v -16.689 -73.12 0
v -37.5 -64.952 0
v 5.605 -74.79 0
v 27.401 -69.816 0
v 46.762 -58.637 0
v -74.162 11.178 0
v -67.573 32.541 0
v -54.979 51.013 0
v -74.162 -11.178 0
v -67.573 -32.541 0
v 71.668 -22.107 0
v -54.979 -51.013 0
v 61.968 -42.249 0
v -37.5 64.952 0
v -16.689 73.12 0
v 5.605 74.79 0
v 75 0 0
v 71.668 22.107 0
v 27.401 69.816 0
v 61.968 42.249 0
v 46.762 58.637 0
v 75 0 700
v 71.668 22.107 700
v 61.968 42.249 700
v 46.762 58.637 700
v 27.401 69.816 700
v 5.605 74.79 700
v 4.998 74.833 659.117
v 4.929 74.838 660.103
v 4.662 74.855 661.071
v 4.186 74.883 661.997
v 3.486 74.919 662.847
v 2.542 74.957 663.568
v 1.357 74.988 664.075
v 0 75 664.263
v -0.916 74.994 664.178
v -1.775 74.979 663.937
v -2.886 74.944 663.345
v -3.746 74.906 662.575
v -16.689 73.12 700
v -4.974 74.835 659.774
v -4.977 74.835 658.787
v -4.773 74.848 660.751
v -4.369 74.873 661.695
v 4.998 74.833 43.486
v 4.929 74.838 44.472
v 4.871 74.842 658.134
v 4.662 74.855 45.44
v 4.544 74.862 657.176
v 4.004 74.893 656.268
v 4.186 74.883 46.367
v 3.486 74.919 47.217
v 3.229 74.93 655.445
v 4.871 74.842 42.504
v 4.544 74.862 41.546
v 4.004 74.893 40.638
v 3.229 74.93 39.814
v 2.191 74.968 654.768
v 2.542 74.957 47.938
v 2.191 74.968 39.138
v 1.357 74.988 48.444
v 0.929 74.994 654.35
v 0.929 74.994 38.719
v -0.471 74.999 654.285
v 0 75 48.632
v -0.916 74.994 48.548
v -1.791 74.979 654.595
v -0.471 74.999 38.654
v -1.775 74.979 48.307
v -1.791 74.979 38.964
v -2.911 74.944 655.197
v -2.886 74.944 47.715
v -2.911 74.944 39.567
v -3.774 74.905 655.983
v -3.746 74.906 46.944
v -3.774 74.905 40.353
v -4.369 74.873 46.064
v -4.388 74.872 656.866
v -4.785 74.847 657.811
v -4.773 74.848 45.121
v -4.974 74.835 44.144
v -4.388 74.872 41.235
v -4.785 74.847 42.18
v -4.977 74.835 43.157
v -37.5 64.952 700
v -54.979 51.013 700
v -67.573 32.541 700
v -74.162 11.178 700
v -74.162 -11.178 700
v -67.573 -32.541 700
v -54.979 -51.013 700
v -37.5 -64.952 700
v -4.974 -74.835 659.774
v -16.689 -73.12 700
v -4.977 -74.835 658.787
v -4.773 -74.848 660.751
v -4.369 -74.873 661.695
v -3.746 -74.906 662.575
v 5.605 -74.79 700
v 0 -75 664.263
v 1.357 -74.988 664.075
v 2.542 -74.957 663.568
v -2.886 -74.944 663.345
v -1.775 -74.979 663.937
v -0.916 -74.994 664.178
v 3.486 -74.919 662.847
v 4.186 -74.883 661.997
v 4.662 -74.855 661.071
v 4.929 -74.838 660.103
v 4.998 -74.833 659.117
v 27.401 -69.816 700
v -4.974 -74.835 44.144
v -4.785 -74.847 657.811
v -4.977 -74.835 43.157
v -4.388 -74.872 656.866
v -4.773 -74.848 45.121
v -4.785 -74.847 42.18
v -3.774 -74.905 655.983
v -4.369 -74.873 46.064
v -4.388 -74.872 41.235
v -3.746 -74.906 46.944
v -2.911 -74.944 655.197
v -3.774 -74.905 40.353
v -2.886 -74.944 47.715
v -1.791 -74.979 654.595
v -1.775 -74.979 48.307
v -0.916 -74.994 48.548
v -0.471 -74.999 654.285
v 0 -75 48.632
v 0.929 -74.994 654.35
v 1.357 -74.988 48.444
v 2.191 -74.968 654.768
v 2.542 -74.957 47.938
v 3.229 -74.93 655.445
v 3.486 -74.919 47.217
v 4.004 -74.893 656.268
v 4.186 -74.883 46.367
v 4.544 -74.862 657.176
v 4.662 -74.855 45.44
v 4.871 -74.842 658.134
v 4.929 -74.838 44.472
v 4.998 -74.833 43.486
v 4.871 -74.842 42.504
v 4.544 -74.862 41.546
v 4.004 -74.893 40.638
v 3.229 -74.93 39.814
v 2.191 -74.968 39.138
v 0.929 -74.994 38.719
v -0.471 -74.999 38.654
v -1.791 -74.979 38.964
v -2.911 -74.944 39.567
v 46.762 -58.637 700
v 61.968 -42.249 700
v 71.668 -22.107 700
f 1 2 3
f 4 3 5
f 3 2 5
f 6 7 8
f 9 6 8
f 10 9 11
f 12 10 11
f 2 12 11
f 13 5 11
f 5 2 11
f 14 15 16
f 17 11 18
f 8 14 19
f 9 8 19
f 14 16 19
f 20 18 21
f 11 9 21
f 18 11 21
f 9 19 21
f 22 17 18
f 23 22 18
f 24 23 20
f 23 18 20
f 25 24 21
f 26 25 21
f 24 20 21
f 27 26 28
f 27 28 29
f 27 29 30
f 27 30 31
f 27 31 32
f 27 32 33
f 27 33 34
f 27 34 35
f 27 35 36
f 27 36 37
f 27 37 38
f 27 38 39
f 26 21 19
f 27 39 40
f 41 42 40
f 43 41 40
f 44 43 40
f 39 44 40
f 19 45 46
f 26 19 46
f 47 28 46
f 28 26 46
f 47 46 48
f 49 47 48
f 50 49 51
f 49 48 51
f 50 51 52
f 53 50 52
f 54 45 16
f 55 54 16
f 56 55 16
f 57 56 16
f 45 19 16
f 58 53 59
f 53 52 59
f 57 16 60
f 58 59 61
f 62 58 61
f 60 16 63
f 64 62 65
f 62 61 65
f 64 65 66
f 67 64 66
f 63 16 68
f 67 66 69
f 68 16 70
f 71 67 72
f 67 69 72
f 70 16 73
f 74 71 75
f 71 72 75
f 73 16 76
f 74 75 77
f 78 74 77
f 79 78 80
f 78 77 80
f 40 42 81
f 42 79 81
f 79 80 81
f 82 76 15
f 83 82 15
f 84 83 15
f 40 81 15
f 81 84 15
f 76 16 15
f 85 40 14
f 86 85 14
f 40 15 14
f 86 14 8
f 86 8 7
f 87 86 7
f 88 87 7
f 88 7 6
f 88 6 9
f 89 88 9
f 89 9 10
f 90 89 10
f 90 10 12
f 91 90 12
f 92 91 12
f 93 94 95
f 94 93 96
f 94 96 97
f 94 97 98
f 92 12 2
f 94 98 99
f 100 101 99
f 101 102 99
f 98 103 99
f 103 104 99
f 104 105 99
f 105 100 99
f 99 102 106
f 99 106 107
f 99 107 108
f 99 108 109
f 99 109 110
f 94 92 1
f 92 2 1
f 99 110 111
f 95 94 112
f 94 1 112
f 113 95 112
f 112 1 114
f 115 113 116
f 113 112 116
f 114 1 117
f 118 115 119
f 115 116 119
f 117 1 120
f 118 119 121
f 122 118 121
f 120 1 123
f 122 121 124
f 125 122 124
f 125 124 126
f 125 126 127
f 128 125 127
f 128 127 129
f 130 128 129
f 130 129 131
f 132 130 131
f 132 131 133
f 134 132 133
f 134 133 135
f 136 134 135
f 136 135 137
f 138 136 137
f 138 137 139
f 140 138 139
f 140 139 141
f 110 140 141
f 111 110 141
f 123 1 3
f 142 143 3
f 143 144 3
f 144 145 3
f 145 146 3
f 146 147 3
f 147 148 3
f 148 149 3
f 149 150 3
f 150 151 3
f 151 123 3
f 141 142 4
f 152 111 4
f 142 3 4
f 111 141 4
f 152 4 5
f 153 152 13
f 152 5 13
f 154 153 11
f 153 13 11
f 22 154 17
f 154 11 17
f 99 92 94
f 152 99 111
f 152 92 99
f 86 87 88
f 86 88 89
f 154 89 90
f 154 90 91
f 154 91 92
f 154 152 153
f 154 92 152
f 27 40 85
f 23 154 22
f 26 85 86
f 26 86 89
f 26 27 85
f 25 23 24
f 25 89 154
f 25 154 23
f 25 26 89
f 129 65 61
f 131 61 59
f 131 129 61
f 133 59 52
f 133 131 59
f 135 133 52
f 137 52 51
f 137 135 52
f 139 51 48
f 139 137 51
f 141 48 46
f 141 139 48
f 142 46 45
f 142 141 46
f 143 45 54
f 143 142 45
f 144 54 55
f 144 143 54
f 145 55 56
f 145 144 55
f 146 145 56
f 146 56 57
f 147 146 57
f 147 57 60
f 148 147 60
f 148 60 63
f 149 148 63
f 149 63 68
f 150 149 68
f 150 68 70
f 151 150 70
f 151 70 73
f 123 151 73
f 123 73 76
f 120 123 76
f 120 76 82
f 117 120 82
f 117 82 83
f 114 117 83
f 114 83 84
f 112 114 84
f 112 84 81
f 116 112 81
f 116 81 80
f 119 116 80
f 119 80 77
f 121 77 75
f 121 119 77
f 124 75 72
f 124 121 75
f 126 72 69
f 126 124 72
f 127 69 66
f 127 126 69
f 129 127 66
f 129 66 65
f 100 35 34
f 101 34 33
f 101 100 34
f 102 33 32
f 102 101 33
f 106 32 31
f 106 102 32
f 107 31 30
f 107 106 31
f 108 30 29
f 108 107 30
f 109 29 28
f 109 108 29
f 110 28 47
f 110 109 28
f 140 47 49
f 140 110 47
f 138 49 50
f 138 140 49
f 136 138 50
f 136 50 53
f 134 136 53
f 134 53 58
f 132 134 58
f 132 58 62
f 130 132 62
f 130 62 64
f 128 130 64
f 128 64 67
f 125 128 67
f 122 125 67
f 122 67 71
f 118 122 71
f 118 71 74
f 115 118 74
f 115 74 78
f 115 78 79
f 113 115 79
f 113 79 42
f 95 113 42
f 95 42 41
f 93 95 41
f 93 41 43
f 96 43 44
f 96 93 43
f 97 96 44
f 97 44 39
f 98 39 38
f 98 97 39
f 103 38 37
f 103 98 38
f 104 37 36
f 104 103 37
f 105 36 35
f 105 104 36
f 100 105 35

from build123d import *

# Parameters (mm, degrees)
SCHIZZO1_R                    = 75
ESTRUSIONE_ESTRUSIONE1_DEPTH  = 700
TAGLIO_ESTRUSIONE1_DEPTH      = 708.990112925
TAGLIO_ESTRUSIONE1_DEPTH_BACK = 708.990112925
SCHIZZO2_R                    = 5
TAGLIO_ESTRUSIONE2_DEPTH      = 708.990113045
TAGLIO_ESTRUSIONE2_DEPTH_BACK = 708.990113045
SCHIZZO3_R                    = 5


with BuildPart() as part:
    # Schizzo1 → Estrusione-Estrusione1 (new body)
    with BuildSketch(Plane.XY):
        Circle(SCHIZZO1_R)
    extrude(amount=ESTRUSIONE_ESTRUSIONE1_DEPTH)

    # Schizzo2 → Taglio-Estrusione1 (cut, two sides: drawn at the far end of the back side and taken through both)
    with BuildSketch(Plane(origin=(0, 0, 0), x_dir=(1, 0, 0), z_dir=(0, 1, 0)).offset(-TAGLIO_ESTRUSIONE1_DEPTH_BACK)):
        with Locations(Location((0, -43.632162592, 0), (0, 0, 270))):
            Circle(SCHIZZO2_R)
    extrude(amount=TAGLIO_ESTRUSIONE1_DEPTH + TAGLIO_ESTRUSIONE1_DEPTH_BACK, mode=Mode.SUBTRACT)

    # Schizzo3 → Taglio-Estrusione2 (cut, two sides: drawn at the far end of the back side and taken through both)
    with BuildSketch(Plane(origin=(0, 0, 0), x_dir=(1, 0, 0), z_dir=(0, 1, 0)).offset(-TAGLIO_ESTRUSIONE2_DEPTH_BACK)):
        with Locations(Location((0, -659.26265162, 0), (0, 0, 270))):
            Circle(SCHIZZO3_R)
    extrude(amount=TAGLIO_ESTRUSIONE2_DEPTH + TAGLIO_ESTRUSIONE2_DEPTH_BACK, mode=Mode.SUBTRACT)


solid = part.part
